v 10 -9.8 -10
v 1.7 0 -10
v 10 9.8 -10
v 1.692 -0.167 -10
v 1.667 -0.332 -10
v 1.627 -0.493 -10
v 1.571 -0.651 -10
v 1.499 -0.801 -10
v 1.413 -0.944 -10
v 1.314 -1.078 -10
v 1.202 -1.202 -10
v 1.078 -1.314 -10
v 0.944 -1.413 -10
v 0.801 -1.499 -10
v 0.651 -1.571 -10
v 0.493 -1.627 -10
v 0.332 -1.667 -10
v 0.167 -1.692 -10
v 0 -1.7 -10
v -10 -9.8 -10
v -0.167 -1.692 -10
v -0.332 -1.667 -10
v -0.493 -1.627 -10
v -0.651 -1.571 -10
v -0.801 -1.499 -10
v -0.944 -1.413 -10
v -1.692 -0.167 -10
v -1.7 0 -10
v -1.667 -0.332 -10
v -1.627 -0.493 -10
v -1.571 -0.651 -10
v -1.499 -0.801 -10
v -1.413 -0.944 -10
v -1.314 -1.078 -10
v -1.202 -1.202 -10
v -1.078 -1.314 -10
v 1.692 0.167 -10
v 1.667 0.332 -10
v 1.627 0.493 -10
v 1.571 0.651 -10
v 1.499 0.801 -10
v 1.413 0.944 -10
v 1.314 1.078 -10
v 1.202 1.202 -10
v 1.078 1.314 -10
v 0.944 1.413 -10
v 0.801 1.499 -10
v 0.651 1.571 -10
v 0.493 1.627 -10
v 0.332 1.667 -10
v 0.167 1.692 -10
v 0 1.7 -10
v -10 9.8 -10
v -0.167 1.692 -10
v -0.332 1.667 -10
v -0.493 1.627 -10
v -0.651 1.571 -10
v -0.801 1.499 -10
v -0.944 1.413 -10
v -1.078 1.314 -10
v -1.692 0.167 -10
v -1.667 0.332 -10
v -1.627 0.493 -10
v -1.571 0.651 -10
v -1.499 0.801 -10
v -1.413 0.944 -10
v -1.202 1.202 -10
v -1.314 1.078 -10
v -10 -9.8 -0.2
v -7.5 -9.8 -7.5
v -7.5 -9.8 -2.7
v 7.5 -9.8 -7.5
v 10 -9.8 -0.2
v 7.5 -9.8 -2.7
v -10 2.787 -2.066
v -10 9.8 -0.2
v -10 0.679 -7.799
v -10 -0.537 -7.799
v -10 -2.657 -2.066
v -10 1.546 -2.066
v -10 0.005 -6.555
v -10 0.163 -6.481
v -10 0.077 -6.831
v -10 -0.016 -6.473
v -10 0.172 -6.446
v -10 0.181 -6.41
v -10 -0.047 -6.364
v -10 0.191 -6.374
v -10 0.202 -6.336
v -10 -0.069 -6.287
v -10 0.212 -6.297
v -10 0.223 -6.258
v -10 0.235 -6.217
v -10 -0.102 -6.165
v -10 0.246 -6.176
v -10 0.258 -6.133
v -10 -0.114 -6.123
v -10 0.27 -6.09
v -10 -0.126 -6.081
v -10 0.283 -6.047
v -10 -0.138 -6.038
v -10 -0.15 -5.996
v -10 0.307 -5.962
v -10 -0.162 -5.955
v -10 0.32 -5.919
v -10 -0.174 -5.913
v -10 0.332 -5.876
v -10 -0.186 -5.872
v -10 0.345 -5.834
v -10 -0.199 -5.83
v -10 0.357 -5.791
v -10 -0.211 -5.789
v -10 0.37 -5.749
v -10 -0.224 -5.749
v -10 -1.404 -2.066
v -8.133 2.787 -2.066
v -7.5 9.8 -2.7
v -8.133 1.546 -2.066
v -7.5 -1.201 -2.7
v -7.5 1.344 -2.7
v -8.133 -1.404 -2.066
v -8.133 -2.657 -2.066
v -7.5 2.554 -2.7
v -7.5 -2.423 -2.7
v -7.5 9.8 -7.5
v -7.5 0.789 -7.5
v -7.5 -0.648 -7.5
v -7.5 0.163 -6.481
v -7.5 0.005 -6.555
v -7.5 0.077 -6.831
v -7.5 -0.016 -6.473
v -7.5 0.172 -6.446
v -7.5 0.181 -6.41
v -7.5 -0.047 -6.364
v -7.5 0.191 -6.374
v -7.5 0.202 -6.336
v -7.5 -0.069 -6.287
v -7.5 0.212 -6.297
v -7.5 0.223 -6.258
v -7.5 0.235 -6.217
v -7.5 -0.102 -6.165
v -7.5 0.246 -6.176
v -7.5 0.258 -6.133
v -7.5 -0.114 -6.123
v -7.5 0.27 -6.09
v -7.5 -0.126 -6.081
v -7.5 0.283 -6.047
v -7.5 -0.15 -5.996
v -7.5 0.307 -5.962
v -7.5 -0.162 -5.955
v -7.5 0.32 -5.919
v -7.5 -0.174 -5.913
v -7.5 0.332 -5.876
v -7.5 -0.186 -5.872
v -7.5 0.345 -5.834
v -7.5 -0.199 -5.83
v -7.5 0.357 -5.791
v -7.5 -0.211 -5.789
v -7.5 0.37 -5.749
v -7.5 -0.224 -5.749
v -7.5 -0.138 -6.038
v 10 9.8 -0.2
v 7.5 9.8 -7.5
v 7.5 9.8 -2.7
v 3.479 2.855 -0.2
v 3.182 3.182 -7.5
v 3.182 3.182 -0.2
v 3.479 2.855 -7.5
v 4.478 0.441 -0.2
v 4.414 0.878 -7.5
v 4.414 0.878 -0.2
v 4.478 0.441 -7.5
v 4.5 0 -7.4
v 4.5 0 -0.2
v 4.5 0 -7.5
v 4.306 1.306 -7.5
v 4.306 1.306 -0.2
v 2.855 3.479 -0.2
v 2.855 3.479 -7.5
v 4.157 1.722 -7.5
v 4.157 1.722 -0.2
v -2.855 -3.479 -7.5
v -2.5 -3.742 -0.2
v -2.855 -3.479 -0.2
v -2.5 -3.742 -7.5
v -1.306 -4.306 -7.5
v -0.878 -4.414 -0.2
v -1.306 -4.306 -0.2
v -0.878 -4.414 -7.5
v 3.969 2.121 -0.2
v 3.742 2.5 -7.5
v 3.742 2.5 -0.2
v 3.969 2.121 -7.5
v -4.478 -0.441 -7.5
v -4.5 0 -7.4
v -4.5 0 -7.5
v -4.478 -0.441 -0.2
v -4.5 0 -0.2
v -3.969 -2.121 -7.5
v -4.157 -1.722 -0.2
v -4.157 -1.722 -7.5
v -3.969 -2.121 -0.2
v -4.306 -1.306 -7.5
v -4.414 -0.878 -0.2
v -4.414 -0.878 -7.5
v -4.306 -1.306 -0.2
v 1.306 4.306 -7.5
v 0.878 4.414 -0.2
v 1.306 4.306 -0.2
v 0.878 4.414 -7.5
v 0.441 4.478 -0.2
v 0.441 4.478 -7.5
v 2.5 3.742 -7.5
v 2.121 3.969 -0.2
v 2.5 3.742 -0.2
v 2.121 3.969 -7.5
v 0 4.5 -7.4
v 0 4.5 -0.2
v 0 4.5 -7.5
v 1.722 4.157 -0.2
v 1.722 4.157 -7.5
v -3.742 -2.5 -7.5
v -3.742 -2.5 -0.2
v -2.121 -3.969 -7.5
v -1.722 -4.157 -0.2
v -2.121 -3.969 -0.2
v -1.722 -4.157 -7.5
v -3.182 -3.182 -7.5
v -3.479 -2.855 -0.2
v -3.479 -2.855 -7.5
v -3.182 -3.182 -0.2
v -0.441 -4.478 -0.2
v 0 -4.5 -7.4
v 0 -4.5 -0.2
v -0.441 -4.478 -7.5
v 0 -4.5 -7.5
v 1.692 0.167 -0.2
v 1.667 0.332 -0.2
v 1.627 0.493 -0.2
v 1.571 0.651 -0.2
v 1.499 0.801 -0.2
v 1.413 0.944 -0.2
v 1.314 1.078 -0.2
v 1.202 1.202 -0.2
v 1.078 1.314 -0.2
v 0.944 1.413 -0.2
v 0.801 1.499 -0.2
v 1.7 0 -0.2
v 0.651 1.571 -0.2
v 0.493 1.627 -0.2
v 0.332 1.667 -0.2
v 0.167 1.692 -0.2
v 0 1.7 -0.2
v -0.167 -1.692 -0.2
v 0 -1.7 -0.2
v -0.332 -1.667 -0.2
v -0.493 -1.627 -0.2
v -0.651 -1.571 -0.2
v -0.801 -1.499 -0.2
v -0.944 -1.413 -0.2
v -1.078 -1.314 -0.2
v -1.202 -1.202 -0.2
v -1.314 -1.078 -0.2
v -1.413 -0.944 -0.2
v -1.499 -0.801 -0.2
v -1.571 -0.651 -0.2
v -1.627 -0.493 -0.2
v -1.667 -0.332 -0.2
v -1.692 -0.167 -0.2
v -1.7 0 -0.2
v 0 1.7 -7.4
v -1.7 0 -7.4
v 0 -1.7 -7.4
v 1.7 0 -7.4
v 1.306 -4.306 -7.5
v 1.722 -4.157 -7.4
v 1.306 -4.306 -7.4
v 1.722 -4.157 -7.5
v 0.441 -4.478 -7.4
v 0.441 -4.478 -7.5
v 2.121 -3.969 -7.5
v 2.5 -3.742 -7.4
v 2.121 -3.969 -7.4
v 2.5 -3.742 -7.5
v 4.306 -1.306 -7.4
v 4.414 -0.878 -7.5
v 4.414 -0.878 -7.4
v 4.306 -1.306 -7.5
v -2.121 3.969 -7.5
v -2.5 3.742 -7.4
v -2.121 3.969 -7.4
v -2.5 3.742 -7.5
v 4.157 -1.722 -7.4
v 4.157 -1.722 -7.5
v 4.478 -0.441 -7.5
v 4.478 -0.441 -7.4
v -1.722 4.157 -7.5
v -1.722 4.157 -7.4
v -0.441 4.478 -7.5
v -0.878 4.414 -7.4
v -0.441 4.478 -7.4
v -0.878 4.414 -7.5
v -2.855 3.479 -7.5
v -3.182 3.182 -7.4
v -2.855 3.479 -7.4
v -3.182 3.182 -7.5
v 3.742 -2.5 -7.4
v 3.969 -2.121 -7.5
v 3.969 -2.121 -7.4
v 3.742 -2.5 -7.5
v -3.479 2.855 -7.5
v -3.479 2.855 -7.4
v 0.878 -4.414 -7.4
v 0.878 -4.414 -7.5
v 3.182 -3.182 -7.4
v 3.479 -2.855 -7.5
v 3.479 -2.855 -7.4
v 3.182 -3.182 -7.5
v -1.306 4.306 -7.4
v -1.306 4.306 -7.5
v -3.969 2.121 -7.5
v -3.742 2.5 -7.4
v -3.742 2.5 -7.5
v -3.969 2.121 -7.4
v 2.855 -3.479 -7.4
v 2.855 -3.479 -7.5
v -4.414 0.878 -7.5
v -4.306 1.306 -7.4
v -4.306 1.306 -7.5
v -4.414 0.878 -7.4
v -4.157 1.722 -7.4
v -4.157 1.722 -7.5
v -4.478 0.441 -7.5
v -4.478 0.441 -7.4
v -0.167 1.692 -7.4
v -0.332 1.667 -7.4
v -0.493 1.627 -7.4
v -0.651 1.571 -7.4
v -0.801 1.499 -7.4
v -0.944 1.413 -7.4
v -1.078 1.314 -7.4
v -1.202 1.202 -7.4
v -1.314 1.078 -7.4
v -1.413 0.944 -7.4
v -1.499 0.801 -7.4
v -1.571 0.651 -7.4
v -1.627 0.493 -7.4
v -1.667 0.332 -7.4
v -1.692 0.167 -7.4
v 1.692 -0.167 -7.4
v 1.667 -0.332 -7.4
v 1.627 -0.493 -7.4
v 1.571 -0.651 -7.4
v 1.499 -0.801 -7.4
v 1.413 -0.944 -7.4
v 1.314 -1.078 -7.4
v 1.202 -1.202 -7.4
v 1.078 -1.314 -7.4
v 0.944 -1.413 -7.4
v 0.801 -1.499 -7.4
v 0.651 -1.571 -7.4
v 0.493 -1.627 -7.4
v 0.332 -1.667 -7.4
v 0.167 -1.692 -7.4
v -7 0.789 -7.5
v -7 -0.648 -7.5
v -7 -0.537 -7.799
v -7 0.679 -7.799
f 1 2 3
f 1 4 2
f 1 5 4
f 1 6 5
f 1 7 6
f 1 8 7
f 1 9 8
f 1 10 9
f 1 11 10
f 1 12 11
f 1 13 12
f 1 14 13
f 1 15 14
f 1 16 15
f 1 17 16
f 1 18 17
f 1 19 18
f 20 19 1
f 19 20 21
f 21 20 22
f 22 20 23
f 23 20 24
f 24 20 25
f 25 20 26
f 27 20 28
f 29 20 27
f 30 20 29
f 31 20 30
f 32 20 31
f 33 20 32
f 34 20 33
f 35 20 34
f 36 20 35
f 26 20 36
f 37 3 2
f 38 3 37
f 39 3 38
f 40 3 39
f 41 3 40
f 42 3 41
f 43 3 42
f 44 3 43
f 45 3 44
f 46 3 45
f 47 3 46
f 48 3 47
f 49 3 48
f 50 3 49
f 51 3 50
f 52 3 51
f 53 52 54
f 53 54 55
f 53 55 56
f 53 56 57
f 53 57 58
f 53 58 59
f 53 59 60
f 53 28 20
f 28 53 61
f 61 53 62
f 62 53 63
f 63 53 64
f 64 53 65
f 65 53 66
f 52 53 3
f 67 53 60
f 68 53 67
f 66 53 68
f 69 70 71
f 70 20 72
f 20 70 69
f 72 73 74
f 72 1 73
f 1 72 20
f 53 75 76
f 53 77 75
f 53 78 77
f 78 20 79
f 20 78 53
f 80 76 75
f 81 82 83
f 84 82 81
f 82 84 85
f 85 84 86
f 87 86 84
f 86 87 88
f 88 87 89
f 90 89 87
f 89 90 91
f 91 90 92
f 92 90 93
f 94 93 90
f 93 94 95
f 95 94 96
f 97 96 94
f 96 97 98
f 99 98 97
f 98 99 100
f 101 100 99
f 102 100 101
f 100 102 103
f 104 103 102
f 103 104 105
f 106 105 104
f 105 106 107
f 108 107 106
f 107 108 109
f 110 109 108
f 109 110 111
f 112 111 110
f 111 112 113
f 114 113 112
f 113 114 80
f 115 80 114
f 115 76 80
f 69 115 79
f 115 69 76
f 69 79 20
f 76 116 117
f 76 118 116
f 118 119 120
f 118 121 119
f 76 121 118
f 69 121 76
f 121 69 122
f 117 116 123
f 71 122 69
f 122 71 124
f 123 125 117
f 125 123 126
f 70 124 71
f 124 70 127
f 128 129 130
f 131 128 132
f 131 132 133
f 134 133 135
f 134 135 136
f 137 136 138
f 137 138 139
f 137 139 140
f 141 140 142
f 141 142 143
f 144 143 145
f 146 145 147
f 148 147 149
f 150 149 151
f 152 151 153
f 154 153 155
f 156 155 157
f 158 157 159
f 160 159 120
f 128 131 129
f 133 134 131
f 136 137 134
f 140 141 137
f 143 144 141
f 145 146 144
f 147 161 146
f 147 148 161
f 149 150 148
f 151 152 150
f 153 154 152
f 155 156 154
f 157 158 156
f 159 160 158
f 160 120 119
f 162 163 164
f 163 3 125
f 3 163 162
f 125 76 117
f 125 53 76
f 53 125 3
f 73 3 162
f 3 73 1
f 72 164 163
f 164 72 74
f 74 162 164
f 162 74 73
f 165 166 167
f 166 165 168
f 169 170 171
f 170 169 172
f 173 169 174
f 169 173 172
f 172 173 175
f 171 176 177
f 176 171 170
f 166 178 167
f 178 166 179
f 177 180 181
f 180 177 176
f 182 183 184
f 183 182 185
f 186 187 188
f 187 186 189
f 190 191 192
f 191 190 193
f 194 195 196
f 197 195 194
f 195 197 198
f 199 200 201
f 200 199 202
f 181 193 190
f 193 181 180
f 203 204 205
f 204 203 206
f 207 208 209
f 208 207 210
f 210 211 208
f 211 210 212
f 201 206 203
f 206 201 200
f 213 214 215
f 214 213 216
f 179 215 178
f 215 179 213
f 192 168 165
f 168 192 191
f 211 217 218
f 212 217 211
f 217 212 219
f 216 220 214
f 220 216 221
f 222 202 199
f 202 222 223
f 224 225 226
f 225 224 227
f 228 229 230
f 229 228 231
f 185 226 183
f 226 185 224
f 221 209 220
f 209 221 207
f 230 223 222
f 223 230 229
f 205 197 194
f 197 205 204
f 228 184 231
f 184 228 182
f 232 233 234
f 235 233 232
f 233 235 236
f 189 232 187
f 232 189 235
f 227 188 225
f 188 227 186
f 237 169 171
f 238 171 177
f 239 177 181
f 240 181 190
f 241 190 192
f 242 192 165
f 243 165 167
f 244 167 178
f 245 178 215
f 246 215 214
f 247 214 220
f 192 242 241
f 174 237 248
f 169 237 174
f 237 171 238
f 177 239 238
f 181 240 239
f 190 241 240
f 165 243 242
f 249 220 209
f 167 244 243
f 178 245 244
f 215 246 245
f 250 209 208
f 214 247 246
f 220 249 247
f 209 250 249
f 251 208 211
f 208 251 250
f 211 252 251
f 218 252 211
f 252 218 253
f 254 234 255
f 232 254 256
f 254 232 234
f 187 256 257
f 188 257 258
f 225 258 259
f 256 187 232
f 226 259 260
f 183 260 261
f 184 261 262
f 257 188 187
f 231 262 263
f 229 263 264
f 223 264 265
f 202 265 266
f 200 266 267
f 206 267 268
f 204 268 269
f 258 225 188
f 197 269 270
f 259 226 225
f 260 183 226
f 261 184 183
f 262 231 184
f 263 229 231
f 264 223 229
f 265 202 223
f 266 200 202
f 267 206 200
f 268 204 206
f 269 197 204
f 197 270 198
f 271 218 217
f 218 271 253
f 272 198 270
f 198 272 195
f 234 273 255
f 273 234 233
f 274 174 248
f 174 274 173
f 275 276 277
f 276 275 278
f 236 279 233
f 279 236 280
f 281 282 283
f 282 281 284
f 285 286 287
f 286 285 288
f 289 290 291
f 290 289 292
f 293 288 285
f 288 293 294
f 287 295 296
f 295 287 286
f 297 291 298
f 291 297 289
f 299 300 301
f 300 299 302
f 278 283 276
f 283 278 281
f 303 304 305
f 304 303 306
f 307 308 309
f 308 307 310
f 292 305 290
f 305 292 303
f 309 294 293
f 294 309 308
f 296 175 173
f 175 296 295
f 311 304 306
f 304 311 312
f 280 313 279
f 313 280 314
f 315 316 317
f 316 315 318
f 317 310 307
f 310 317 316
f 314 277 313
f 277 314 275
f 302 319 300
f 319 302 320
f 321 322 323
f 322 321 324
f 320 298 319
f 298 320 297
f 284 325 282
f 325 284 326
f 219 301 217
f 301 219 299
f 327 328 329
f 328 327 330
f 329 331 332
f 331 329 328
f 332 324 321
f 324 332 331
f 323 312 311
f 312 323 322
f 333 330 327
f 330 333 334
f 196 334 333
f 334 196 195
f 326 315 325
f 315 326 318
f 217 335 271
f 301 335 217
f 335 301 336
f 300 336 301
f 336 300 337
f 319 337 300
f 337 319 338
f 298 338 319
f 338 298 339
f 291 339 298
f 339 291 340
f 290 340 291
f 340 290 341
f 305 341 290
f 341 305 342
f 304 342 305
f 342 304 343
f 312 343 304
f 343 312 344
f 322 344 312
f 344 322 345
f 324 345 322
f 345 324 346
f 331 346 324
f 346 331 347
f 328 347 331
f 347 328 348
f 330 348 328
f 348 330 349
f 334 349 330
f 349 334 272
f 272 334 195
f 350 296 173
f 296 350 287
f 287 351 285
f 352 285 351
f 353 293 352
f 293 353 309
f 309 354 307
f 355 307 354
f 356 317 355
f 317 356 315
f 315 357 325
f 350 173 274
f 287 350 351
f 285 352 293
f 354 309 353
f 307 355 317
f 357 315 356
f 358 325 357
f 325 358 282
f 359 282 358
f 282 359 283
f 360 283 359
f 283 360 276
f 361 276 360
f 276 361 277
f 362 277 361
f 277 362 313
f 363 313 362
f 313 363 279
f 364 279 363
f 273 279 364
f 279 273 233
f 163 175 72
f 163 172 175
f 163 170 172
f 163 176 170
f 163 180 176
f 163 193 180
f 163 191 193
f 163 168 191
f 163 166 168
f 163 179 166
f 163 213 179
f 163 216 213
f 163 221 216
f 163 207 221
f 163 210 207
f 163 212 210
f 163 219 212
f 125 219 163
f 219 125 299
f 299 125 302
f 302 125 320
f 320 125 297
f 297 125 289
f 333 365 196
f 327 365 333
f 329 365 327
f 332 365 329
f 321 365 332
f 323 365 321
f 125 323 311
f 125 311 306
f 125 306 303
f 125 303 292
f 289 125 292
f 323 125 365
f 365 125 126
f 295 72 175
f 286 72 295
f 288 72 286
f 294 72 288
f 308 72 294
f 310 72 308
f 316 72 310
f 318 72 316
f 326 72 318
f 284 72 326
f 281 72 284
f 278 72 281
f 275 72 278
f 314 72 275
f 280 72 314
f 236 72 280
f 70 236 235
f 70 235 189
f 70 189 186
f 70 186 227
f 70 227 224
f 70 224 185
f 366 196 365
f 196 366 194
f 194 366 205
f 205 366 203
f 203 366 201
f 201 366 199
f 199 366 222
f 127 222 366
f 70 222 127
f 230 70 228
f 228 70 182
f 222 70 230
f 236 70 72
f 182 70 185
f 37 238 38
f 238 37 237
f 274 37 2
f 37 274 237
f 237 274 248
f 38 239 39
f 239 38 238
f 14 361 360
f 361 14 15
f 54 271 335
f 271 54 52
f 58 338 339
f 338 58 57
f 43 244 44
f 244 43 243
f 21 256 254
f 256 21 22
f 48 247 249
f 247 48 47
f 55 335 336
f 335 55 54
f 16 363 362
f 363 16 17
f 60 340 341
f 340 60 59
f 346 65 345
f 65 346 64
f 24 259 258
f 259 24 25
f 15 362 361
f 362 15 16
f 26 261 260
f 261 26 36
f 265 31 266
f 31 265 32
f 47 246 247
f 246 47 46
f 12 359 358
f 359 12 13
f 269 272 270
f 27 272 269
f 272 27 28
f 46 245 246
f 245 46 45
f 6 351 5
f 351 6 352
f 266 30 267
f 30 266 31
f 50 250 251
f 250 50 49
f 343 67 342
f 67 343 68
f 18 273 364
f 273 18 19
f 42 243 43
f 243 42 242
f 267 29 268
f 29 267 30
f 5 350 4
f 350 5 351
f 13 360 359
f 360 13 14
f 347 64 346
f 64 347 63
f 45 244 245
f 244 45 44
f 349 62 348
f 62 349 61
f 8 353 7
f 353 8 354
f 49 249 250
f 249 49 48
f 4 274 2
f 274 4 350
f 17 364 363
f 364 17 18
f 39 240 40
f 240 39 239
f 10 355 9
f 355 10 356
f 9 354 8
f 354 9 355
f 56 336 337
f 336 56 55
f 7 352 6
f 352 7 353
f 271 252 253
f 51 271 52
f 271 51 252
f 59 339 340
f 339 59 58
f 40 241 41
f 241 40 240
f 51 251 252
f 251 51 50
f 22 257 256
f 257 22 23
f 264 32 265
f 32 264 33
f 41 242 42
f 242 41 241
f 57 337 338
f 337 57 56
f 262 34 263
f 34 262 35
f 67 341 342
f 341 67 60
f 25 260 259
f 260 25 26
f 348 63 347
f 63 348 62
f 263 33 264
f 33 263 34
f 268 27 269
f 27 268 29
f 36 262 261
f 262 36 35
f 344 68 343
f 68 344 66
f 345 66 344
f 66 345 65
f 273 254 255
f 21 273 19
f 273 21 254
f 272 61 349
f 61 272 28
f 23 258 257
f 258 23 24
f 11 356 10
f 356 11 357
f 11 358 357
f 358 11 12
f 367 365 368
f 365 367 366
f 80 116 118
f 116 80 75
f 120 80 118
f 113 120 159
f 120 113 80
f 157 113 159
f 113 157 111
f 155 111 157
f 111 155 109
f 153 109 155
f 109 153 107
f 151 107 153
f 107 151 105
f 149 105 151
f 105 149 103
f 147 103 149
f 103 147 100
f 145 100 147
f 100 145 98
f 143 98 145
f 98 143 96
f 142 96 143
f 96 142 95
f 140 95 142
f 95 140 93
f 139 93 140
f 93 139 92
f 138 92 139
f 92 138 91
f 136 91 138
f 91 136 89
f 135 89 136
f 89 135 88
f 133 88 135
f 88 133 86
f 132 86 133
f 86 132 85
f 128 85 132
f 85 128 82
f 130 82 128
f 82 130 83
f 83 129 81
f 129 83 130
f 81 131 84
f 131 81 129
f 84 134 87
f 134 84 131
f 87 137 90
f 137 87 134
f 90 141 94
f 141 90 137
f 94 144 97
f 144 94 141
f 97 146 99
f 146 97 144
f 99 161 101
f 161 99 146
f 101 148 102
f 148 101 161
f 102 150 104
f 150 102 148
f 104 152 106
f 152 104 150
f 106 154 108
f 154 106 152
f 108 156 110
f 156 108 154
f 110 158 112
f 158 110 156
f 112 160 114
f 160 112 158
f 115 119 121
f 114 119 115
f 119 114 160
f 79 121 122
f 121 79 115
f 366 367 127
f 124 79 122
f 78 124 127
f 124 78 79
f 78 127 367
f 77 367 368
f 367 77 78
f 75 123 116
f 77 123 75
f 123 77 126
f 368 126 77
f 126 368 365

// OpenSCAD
// half_cube.scad - Simplified Parametric Half-Cube
// Designed for verification: single volume, watertight, no collision
// Units: mm

$fn = 64;

// --- Parameters ---
size = 20.0;          // Outer cube dimension
thick = 2.5;          // Wall thickness
rod_D = 3.0;          // Rod diameter
clearance = 0.2;      // Clearance for rod bore
fit_clear = 0.2;      // Miter face clearance (increased per research)

// --- Visibility Toggles ---
show_base = true;
show_walls = true;
show_mech = true;
show_letter = true;

// --- Flip Mode (for top unit) ---
is_flipped = false;        // true = top unit (rotated mechanism, inverted letter)

// --- Letter Parameters ---
letter = is_flipped ? "F" : "V";  // Default: V for bottom, F for top
letter_emboss = false;     // true = raised, false = carved
letter_depth = 0.5;        // Depth/height of letter (mm)
letter_size = 6;           // Font size (mm)

// Derived
cyl_R = 4.5;          // Mechanism cylinder radius
cyl_H = size/2 - thick - fit_clear; // Height from base top to part top

// --- Main Assembly ---
module assembly(flipped=is_flipped) {
    difference() {
        union() {
            // 1. Base Plate (bottom of U-channel)
            if (show_base)
                translate([0, 0, -size/2 + thick/2])
                    base_plate();
            
            // 2. Side Walls with mitered edges
            if (show_walls) {
                translate([-size/2 + thick/2, 0, 0])
                    mitered_wall();
                translate([size/2 - thick/2, 0, 0])
                    mirror([1,0,0]) mitered_wall();
            }
            
            // 3. Central mechanism pillars
            // Position at base plate bottom (z=-10) so base_ring spans through base
            if (show_mech)
                translate([0, 0, -size/2])  // Start at very bottom of part
                    mechanism_pillars(flipped=flipped);
            
            // 4. Letter (embossed mode - raised)
            if (show_letter && letter_emboss)
                letter_geometry(flipped=flipped);
        }
        
        // Global subtractions
        // Rod bore through center
        cylinder(r=rod_D/2 + clearance, h=size*2, center=true);
        
        // Letter (carved mode - recessed)
        if (show_letter && !letter_emboss)
            letter_geometry(flipped=flipped);
    }
}

// --- Base Plate ---
// Full width in X and Y, with trapezoid profile in Y-Z
module base_plate() {
    // Simple rectangular base that spans full width
    // The Y dimension must go edge to edge (minus clearance)
    cube([size - 2*fit_clear, size - 2*fit_clear, thick], center=true);
}

// --- Mitered Wall ---
// Wall with 45° chamfer only on top for mating interface
// Wall only spans HALF the cube (from base to midpoint)
module mitered_wall() {
    // The wall needs to span: 
    //   X = thick (wall thickness)
    //   Y = size (full cube width, minus clearance)
    //   Z = half cube height (from -size/2 to -fit_clear)
    
    wall_length = size - 2*fit_clear;  // Y dimension
    
    // Rotate the extrusion so it extends along Y instead of Z
    rotate([90, 0, 0])  // Rotate -90° around X to point extrusion in -Y (then center=true makes it +/-Y)
    linear_extrude(wall_length, center=true)  // This now extrudes along Y
        // Polygon in XZ plane (after rotation, this becomes the actual XZ plane of the wall)
        polygon([
            [-thick/2, -size/2],             // Bottom-outer (z=-10)
            [-thick/2, -fit_clear],          // Top-outer (z=-0.2)
            [thick/2, -thick - fit_clear],   // Top-inner (z=-2.7, chamfered)
            [thick/2, -size/2]               // Bottom-inner (z=-10)
        ]);
}

// --- Letter Geometry ---
// Places letter on left wall exterior
// Flipped 180° for top unit so it reads correctly after assembly
module letter_geometry(flipped=is_flipped) {
    // Position on left wall exterior face
    wall_x = -size/2;  // Left wall position
    letter_z = -size/4;  // Center of wall height
    
    // Determine letter and rotation based on local flipped state
    local_letter = flipped ? "F" : "V";
    
    // Rotation: 90° to face outward from wall
    // When flipped: add 180° so letter reads correctly after assembly flip
    flip_angle = flipped ? 180 : 0;
    
    translate([wall_x, 0, letter_z])
        rotate([90, flip_angle, 90]) { // Face outward (-X direction)
            // Counter-mirror for flipped unit to ensure text reads Left-to-Right
            scale([flipped ? -1 : 1, 1, 1])
            
            linear_extrude(letter_depth + (letter_emboss ? 0 : thick))
                text(local_letter, size=letter_size, halign="center", valign="center", 
                     font="Liberation Sans:style=Bold");
}
}

// --- Mechanism Pillars ---
// Two opposing quadrant pillars with a solid base ring
// Bottom unit: pillars at 0°/180°, cuts at 90°/270°
// Flipped unit: pillars at 90°/270°, cuts at 0°/180° (rotated 90°)
module mechanism_pillars(flipped=is_flipped) {
    base_ring_h = thick + 0.1;  // Height of solid ring = base plate thickness + overlap
    pillar_height = cyl_H;
    
    // Rotate entire mechanism 90° for flipped (top) unit
    mech_rotation = flipped ? 90 : 0;
    
    rotate([0, 0, mech_rotation])
    union() {
        // 1. Solid base ring (no wedge cuts) - this connects to base plate
        cylinder(r=cyl_R, h=base_ring_h);
        
        // 2. Pillars above the base ring (with wedge cuts)
        translate([0, 0, base_ring_h - 0.1])  // Small overlap for solid union
            difference() {
                cylinder(r=cyl_R, h=pillar_height);
                
                // Cut away two opposing quadrants (90° and 270°)
                rotate([0, 0, 90])
                    wedge_cutter(pillar_height + 1);
                rotate([0, 0, 270])
                    wedge_cutter(pillar_height + 1);
            }
    }
}

// Wedge cutter for 90° sector
module wedge_cutter(h=size) {
    linear_extrude(h)
        polygon([[0, 0], [size, 0], [0, size]]);
}

// --- Render ---
// Only render if not included as library
if (is_undef(is_library)) {
    assembly();
}
